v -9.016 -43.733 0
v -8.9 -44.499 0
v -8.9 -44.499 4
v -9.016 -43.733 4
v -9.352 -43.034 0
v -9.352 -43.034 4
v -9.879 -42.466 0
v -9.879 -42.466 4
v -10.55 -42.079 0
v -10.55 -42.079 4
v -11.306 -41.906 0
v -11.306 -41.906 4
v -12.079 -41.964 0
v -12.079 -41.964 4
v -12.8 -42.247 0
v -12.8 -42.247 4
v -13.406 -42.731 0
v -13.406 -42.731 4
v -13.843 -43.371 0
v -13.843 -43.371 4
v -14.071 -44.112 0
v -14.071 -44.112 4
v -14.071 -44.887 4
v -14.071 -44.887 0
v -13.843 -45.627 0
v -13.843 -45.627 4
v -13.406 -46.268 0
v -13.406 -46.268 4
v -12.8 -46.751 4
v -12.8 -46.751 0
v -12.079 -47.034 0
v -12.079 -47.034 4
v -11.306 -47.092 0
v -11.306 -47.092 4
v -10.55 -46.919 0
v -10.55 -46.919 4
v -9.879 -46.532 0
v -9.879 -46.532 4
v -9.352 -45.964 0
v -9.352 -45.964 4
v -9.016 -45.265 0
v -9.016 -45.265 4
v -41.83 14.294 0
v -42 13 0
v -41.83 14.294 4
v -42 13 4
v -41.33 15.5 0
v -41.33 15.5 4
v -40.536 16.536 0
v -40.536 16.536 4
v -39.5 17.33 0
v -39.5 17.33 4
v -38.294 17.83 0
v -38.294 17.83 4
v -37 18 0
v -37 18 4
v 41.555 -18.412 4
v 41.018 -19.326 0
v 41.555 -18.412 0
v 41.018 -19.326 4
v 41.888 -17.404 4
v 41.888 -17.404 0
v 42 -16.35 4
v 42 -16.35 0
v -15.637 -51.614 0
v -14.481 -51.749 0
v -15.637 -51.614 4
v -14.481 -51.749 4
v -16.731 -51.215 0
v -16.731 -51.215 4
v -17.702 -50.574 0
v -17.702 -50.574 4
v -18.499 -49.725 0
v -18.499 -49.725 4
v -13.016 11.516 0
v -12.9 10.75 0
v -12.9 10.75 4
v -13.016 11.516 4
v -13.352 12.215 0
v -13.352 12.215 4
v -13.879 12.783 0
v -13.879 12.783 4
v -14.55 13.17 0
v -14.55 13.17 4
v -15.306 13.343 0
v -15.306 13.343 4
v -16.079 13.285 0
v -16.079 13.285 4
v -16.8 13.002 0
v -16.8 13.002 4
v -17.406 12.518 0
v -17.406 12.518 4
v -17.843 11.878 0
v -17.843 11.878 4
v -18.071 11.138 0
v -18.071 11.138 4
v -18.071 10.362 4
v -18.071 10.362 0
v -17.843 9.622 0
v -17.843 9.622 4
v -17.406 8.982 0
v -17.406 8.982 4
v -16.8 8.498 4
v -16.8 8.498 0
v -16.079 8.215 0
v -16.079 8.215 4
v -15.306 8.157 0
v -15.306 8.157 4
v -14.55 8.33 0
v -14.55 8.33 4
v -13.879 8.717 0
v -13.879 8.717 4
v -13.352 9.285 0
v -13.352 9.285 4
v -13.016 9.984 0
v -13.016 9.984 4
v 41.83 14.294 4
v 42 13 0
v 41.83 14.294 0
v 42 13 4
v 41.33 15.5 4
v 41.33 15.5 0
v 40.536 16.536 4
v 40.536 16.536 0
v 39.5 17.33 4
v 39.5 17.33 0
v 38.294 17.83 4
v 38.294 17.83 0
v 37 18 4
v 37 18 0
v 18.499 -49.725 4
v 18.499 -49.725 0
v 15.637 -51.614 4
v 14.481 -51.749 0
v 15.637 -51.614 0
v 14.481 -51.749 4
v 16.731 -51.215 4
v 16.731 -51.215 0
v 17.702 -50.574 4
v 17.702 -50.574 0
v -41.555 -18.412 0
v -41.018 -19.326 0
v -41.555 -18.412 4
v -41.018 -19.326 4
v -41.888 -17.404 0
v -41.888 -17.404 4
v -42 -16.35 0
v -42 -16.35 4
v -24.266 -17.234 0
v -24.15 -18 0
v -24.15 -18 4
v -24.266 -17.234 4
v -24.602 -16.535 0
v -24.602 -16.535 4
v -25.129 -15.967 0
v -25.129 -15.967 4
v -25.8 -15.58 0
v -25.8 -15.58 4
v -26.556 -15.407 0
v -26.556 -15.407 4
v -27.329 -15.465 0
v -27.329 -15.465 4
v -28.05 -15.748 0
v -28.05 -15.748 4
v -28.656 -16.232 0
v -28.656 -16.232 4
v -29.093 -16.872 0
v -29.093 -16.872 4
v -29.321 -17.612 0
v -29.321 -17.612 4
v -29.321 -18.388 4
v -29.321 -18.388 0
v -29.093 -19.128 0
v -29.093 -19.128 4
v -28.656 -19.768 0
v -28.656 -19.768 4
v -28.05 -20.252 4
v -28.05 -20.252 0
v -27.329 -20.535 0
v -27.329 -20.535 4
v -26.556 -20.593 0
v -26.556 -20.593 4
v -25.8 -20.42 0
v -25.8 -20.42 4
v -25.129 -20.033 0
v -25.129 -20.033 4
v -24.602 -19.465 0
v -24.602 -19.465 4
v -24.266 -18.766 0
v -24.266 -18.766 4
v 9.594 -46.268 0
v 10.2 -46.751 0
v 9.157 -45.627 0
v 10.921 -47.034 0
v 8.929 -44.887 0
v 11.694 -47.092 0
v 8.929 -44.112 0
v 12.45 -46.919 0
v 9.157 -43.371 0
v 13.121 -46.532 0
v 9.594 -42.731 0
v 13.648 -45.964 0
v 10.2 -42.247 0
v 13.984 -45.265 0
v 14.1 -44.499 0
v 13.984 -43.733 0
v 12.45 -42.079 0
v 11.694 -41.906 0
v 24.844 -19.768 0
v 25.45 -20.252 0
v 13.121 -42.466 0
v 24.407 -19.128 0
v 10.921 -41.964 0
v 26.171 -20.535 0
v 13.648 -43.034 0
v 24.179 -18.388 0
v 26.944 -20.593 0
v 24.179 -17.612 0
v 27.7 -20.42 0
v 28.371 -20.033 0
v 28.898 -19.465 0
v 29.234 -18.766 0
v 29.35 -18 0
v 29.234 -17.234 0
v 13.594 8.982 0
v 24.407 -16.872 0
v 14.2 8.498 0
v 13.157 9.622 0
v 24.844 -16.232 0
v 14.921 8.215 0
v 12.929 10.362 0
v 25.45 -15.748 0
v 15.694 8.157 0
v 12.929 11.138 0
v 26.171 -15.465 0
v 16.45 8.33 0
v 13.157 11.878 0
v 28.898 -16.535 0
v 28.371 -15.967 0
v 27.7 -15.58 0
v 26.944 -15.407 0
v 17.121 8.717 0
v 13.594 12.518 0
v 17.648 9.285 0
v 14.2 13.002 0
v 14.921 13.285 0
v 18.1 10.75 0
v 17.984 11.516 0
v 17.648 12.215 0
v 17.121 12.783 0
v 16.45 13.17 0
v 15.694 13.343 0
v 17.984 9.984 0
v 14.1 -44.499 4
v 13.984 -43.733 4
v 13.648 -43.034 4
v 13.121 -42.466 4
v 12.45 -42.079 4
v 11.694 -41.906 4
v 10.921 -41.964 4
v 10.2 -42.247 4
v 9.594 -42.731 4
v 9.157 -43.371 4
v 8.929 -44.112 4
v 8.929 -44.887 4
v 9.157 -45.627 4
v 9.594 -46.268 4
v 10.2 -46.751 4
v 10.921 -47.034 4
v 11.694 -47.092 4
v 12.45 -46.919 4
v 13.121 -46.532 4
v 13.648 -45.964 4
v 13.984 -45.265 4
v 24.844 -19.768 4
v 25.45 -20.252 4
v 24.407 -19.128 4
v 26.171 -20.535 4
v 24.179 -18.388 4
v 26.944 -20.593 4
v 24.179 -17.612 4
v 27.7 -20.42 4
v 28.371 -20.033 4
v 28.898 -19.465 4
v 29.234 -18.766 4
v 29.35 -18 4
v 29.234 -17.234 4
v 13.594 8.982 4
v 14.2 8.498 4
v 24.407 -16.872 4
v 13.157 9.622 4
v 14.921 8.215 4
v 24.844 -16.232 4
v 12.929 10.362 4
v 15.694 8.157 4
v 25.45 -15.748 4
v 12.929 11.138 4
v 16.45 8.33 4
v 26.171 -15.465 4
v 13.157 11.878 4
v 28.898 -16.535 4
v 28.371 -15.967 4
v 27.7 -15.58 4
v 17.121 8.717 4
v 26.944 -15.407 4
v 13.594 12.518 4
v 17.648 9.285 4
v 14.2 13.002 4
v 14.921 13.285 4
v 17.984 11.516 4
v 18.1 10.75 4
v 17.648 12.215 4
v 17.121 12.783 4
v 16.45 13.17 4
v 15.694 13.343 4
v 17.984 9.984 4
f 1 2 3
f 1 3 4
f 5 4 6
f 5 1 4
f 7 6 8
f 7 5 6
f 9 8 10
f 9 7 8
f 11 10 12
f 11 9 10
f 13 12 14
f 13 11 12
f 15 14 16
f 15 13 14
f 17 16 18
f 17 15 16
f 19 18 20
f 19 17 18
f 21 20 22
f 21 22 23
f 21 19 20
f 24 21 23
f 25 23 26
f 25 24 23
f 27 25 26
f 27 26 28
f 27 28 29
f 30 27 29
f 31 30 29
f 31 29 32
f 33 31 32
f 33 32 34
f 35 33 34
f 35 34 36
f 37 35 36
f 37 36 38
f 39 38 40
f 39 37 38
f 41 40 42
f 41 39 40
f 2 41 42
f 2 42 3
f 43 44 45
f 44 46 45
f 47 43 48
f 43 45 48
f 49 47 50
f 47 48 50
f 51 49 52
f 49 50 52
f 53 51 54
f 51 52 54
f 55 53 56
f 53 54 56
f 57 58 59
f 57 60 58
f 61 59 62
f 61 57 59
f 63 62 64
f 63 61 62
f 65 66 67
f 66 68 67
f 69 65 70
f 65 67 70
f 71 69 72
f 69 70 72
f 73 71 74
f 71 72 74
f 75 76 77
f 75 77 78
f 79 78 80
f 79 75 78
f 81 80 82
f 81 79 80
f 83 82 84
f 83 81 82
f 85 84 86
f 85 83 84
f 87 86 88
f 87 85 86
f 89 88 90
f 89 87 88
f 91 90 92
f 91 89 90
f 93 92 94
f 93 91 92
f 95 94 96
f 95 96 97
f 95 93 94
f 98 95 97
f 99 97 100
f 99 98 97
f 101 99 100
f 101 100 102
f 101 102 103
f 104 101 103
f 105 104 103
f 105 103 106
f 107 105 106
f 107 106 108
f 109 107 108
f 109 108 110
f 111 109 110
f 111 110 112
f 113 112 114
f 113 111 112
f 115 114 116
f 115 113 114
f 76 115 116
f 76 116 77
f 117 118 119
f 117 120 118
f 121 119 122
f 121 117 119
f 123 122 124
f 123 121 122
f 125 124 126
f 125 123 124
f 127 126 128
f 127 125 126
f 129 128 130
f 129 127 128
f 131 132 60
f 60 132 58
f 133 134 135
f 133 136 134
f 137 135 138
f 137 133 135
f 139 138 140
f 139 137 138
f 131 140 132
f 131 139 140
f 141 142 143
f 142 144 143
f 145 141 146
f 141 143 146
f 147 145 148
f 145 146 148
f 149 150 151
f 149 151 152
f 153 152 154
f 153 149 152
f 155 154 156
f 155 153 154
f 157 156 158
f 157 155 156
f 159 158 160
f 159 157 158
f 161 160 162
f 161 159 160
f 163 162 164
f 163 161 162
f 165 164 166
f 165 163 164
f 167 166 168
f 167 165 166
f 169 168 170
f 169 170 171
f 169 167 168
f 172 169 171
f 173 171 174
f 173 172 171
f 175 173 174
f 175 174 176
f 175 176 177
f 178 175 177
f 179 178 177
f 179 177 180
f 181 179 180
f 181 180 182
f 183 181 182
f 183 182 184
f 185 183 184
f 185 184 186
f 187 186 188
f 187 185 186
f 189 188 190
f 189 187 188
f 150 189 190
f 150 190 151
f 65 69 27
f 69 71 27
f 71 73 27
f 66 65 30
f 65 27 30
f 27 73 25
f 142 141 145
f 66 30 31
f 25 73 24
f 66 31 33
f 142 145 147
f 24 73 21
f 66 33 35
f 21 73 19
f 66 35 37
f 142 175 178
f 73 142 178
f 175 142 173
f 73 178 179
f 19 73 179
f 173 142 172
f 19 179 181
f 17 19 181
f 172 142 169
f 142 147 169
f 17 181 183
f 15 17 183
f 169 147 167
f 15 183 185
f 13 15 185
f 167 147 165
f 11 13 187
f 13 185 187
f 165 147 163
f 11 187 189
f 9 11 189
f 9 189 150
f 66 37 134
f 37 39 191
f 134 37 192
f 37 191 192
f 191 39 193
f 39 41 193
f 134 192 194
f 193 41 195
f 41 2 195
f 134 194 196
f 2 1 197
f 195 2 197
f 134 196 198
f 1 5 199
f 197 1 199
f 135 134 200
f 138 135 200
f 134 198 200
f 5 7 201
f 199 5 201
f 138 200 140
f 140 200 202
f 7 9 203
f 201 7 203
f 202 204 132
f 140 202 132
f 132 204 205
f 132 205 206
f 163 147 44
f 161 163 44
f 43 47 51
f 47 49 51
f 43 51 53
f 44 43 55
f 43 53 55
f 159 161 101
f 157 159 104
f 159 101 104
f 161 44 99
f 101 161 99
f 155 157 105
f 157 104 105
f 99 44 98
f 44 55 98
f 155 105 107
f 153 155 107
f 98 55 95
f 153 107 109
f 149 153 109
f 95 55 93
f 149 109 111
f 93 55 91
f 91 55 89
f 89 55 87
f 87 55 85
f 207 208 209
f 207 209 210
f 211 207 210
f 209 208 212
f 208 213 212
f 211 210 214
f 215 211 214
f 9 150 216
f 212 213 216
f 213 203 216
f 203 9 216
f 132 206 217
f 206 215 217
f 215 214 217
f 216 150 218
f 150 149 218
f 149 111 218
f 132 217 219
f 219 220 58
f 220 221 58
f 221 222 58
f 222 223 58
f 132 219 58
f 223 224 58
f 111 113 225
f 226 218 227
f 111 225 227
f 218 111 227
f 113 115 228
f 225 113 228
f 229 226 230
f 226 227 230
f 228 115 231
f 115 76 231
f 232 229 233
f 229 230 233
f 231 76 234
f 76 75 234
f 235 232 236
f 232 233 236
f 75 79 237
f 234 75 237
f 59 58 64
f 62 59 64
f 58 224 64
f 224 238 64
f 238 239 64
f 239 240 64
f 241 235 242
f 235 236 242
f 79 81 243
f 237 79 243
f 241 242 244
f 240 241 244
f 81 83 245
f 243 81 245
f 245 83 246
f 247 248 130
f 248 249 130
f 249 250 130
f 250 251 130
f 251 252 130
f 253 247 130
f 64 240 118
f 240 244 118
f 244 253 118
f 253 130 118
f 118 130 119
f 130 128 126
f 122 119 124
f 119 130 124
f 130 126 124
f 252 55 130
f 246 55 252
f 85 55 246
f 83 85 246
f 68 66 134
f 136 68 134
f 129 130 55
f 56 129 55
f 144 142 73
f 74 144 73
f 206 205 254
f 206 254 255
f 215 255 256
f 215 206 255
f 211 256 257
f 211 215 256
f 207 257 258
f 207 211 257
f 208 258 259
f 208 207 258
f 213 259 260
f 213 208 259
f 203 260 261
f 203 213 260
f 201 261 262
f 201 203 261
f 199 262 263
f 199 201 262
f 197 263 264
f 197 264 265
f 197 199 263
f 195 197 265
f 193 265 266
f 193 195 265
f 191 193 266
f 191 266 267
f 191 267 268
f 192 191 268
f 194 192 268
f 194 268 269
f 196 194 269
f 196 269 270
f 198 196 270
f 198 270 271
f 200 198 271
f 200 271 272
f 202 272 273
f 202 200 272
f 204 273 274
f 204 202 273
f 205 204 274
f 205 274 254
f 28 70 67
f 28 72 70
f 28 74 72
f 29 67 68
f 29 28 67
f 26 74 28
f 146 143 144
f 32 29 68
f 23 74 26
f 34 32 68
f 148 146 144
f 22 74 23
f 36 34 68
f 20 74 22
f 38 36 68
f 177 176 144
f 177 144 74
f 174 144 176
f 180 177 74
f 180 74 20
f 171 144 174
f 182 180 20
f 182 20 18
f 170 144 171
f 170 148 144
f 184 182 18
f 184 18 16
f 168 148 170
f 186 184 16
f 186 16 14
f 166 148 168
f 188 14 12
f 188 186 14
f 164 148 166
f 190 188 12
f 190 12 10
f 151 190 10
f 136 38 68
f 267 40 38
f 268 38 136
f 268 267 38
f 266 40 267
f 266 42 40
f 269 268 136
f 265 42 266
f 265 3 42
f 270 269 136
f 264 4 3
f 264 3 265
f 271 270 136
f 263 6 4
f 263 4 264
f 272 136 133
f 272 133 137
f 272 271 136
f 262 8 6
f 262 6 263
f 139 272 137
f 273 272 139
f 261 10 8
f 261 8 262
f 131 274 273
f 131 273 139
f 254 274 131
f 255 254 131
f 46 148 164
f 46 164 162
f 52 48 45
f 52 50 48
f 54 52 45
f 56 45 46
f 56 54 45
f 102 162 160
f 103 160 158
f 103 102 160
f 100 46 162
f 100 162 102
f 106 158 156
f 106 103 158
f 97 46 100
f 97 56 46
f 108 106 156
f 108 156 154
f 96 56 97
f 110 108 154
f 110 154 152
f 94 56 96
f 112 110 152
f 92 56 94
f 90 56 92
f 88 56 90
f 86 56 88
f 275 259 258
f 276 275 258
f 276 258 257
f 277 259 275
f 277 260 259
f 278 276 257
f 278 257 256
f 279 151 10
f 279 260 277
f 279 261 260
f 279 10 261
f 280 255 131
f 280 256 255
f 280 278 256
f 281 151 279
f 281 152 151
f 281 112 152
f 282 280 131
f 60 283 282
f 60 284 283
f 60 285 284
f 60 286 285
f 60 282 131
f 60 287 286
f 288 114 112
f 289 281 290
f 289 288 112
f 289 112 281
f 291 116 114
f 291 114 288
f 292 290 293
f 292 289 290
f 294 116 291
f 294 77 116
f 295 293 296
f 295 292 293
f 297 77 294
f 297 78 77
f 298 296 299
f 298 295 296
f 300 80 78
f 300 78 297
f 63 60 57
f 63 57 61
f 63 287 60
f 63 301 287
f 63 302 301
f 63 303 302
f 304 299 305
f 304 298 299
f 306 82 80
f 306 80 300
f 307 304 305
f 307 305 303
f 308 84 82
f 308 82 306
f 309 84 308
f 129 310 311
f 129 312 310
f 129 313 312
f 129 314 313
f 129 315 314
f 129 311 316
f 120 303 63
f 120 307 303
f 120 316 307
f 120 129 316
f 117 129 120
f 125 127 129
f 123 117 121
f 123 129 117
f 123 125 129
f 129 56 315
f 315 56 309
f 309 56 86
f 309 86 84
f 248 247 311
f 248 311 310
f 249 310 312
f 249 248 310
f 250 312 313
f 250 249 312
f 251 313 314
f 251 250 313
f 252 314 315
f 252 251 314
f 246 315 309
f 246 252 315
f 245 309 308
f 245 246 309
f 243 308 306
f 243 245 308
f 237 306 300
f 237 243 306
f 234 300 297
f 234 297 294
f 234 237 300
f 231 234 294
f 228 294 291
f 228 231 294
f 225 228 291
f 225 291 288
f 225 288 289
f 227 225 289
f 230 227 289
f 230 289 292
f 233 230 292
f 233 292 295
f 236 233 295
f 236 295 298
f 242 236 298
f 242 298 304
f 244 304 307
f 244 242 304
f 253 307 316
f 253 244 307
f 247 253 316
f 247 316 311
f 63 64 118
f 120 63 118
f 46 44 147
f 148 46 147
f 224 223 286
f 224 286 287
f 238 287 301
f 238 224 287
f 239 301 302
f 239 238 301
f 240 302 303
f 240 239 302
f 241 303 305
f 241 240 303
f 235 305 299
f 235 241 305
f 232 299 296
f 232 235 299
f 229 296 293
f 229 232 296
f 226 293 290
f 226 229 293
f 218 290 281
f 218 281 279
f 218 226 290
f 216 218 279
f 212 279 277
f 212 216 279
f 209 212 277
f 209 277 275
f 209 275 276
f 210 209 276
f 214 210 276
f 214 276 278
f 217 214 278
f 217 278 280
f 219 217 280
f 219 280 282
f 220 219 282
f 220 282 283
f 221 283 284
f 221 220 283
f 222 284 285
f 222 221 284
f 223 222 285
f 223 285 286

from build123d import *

# Parameters (mm, degrees)
SKETCH1_R           = 2.6
BOSS_EXTRUDE1_DEPTH = 4
FILLET1_R           = 5


with BuildPart() as part:
    # Sketch1 → Boss-Extrude1 (new body)
    with BuildSketch(Plane.XY):
        Polygon((-17, -51.749074061), (17, -51.749074061), (42, -18), (42, 18), (-42, 18), (-42, -18), align=None)
        with Locations((-15.5, 10.75)):
            Circle(SKETCH1_R, mode=Mode.SUBTRACT)
        with Locations((15.5, 10.75)):
            Circle(SKETCH1_R, mode=Mode.SUBTRACT)
        with Locations((-26.75, -18)):
            Circle(SKETCH1_R, mode=Mode.SUBTRACT)
        with Locations((26.75, -18)):
            Circle(SKETCH1_R, mode=Mode.SUBTRACT)
        with Locations((-11.5, -44.499074061)):
            Circle(SKETCH1_R, mode=Mode.SUBTRACT)
        with Locations((11.5, -44.499074061)):
            Circle(SKETCH1_R, mode=Mode.SUBTRACT)
    extrude(amount=BOSS_EXTRUDE1_DEPTH)

    # Fillet1
    fillet1_edges = [part.edges().sort_by_distance(p)[0] for p in [
        (17, -51.749074061, 2),
        (-17, -51.749074061, 2),
        (-42, -18, 2),
        (-42, 18, 2),
        (42, 18, 2),
        (42, -18, 2),
    ]]
    fillet(fillet1_edges, radius=FILLET1_R)


solid = part.part
